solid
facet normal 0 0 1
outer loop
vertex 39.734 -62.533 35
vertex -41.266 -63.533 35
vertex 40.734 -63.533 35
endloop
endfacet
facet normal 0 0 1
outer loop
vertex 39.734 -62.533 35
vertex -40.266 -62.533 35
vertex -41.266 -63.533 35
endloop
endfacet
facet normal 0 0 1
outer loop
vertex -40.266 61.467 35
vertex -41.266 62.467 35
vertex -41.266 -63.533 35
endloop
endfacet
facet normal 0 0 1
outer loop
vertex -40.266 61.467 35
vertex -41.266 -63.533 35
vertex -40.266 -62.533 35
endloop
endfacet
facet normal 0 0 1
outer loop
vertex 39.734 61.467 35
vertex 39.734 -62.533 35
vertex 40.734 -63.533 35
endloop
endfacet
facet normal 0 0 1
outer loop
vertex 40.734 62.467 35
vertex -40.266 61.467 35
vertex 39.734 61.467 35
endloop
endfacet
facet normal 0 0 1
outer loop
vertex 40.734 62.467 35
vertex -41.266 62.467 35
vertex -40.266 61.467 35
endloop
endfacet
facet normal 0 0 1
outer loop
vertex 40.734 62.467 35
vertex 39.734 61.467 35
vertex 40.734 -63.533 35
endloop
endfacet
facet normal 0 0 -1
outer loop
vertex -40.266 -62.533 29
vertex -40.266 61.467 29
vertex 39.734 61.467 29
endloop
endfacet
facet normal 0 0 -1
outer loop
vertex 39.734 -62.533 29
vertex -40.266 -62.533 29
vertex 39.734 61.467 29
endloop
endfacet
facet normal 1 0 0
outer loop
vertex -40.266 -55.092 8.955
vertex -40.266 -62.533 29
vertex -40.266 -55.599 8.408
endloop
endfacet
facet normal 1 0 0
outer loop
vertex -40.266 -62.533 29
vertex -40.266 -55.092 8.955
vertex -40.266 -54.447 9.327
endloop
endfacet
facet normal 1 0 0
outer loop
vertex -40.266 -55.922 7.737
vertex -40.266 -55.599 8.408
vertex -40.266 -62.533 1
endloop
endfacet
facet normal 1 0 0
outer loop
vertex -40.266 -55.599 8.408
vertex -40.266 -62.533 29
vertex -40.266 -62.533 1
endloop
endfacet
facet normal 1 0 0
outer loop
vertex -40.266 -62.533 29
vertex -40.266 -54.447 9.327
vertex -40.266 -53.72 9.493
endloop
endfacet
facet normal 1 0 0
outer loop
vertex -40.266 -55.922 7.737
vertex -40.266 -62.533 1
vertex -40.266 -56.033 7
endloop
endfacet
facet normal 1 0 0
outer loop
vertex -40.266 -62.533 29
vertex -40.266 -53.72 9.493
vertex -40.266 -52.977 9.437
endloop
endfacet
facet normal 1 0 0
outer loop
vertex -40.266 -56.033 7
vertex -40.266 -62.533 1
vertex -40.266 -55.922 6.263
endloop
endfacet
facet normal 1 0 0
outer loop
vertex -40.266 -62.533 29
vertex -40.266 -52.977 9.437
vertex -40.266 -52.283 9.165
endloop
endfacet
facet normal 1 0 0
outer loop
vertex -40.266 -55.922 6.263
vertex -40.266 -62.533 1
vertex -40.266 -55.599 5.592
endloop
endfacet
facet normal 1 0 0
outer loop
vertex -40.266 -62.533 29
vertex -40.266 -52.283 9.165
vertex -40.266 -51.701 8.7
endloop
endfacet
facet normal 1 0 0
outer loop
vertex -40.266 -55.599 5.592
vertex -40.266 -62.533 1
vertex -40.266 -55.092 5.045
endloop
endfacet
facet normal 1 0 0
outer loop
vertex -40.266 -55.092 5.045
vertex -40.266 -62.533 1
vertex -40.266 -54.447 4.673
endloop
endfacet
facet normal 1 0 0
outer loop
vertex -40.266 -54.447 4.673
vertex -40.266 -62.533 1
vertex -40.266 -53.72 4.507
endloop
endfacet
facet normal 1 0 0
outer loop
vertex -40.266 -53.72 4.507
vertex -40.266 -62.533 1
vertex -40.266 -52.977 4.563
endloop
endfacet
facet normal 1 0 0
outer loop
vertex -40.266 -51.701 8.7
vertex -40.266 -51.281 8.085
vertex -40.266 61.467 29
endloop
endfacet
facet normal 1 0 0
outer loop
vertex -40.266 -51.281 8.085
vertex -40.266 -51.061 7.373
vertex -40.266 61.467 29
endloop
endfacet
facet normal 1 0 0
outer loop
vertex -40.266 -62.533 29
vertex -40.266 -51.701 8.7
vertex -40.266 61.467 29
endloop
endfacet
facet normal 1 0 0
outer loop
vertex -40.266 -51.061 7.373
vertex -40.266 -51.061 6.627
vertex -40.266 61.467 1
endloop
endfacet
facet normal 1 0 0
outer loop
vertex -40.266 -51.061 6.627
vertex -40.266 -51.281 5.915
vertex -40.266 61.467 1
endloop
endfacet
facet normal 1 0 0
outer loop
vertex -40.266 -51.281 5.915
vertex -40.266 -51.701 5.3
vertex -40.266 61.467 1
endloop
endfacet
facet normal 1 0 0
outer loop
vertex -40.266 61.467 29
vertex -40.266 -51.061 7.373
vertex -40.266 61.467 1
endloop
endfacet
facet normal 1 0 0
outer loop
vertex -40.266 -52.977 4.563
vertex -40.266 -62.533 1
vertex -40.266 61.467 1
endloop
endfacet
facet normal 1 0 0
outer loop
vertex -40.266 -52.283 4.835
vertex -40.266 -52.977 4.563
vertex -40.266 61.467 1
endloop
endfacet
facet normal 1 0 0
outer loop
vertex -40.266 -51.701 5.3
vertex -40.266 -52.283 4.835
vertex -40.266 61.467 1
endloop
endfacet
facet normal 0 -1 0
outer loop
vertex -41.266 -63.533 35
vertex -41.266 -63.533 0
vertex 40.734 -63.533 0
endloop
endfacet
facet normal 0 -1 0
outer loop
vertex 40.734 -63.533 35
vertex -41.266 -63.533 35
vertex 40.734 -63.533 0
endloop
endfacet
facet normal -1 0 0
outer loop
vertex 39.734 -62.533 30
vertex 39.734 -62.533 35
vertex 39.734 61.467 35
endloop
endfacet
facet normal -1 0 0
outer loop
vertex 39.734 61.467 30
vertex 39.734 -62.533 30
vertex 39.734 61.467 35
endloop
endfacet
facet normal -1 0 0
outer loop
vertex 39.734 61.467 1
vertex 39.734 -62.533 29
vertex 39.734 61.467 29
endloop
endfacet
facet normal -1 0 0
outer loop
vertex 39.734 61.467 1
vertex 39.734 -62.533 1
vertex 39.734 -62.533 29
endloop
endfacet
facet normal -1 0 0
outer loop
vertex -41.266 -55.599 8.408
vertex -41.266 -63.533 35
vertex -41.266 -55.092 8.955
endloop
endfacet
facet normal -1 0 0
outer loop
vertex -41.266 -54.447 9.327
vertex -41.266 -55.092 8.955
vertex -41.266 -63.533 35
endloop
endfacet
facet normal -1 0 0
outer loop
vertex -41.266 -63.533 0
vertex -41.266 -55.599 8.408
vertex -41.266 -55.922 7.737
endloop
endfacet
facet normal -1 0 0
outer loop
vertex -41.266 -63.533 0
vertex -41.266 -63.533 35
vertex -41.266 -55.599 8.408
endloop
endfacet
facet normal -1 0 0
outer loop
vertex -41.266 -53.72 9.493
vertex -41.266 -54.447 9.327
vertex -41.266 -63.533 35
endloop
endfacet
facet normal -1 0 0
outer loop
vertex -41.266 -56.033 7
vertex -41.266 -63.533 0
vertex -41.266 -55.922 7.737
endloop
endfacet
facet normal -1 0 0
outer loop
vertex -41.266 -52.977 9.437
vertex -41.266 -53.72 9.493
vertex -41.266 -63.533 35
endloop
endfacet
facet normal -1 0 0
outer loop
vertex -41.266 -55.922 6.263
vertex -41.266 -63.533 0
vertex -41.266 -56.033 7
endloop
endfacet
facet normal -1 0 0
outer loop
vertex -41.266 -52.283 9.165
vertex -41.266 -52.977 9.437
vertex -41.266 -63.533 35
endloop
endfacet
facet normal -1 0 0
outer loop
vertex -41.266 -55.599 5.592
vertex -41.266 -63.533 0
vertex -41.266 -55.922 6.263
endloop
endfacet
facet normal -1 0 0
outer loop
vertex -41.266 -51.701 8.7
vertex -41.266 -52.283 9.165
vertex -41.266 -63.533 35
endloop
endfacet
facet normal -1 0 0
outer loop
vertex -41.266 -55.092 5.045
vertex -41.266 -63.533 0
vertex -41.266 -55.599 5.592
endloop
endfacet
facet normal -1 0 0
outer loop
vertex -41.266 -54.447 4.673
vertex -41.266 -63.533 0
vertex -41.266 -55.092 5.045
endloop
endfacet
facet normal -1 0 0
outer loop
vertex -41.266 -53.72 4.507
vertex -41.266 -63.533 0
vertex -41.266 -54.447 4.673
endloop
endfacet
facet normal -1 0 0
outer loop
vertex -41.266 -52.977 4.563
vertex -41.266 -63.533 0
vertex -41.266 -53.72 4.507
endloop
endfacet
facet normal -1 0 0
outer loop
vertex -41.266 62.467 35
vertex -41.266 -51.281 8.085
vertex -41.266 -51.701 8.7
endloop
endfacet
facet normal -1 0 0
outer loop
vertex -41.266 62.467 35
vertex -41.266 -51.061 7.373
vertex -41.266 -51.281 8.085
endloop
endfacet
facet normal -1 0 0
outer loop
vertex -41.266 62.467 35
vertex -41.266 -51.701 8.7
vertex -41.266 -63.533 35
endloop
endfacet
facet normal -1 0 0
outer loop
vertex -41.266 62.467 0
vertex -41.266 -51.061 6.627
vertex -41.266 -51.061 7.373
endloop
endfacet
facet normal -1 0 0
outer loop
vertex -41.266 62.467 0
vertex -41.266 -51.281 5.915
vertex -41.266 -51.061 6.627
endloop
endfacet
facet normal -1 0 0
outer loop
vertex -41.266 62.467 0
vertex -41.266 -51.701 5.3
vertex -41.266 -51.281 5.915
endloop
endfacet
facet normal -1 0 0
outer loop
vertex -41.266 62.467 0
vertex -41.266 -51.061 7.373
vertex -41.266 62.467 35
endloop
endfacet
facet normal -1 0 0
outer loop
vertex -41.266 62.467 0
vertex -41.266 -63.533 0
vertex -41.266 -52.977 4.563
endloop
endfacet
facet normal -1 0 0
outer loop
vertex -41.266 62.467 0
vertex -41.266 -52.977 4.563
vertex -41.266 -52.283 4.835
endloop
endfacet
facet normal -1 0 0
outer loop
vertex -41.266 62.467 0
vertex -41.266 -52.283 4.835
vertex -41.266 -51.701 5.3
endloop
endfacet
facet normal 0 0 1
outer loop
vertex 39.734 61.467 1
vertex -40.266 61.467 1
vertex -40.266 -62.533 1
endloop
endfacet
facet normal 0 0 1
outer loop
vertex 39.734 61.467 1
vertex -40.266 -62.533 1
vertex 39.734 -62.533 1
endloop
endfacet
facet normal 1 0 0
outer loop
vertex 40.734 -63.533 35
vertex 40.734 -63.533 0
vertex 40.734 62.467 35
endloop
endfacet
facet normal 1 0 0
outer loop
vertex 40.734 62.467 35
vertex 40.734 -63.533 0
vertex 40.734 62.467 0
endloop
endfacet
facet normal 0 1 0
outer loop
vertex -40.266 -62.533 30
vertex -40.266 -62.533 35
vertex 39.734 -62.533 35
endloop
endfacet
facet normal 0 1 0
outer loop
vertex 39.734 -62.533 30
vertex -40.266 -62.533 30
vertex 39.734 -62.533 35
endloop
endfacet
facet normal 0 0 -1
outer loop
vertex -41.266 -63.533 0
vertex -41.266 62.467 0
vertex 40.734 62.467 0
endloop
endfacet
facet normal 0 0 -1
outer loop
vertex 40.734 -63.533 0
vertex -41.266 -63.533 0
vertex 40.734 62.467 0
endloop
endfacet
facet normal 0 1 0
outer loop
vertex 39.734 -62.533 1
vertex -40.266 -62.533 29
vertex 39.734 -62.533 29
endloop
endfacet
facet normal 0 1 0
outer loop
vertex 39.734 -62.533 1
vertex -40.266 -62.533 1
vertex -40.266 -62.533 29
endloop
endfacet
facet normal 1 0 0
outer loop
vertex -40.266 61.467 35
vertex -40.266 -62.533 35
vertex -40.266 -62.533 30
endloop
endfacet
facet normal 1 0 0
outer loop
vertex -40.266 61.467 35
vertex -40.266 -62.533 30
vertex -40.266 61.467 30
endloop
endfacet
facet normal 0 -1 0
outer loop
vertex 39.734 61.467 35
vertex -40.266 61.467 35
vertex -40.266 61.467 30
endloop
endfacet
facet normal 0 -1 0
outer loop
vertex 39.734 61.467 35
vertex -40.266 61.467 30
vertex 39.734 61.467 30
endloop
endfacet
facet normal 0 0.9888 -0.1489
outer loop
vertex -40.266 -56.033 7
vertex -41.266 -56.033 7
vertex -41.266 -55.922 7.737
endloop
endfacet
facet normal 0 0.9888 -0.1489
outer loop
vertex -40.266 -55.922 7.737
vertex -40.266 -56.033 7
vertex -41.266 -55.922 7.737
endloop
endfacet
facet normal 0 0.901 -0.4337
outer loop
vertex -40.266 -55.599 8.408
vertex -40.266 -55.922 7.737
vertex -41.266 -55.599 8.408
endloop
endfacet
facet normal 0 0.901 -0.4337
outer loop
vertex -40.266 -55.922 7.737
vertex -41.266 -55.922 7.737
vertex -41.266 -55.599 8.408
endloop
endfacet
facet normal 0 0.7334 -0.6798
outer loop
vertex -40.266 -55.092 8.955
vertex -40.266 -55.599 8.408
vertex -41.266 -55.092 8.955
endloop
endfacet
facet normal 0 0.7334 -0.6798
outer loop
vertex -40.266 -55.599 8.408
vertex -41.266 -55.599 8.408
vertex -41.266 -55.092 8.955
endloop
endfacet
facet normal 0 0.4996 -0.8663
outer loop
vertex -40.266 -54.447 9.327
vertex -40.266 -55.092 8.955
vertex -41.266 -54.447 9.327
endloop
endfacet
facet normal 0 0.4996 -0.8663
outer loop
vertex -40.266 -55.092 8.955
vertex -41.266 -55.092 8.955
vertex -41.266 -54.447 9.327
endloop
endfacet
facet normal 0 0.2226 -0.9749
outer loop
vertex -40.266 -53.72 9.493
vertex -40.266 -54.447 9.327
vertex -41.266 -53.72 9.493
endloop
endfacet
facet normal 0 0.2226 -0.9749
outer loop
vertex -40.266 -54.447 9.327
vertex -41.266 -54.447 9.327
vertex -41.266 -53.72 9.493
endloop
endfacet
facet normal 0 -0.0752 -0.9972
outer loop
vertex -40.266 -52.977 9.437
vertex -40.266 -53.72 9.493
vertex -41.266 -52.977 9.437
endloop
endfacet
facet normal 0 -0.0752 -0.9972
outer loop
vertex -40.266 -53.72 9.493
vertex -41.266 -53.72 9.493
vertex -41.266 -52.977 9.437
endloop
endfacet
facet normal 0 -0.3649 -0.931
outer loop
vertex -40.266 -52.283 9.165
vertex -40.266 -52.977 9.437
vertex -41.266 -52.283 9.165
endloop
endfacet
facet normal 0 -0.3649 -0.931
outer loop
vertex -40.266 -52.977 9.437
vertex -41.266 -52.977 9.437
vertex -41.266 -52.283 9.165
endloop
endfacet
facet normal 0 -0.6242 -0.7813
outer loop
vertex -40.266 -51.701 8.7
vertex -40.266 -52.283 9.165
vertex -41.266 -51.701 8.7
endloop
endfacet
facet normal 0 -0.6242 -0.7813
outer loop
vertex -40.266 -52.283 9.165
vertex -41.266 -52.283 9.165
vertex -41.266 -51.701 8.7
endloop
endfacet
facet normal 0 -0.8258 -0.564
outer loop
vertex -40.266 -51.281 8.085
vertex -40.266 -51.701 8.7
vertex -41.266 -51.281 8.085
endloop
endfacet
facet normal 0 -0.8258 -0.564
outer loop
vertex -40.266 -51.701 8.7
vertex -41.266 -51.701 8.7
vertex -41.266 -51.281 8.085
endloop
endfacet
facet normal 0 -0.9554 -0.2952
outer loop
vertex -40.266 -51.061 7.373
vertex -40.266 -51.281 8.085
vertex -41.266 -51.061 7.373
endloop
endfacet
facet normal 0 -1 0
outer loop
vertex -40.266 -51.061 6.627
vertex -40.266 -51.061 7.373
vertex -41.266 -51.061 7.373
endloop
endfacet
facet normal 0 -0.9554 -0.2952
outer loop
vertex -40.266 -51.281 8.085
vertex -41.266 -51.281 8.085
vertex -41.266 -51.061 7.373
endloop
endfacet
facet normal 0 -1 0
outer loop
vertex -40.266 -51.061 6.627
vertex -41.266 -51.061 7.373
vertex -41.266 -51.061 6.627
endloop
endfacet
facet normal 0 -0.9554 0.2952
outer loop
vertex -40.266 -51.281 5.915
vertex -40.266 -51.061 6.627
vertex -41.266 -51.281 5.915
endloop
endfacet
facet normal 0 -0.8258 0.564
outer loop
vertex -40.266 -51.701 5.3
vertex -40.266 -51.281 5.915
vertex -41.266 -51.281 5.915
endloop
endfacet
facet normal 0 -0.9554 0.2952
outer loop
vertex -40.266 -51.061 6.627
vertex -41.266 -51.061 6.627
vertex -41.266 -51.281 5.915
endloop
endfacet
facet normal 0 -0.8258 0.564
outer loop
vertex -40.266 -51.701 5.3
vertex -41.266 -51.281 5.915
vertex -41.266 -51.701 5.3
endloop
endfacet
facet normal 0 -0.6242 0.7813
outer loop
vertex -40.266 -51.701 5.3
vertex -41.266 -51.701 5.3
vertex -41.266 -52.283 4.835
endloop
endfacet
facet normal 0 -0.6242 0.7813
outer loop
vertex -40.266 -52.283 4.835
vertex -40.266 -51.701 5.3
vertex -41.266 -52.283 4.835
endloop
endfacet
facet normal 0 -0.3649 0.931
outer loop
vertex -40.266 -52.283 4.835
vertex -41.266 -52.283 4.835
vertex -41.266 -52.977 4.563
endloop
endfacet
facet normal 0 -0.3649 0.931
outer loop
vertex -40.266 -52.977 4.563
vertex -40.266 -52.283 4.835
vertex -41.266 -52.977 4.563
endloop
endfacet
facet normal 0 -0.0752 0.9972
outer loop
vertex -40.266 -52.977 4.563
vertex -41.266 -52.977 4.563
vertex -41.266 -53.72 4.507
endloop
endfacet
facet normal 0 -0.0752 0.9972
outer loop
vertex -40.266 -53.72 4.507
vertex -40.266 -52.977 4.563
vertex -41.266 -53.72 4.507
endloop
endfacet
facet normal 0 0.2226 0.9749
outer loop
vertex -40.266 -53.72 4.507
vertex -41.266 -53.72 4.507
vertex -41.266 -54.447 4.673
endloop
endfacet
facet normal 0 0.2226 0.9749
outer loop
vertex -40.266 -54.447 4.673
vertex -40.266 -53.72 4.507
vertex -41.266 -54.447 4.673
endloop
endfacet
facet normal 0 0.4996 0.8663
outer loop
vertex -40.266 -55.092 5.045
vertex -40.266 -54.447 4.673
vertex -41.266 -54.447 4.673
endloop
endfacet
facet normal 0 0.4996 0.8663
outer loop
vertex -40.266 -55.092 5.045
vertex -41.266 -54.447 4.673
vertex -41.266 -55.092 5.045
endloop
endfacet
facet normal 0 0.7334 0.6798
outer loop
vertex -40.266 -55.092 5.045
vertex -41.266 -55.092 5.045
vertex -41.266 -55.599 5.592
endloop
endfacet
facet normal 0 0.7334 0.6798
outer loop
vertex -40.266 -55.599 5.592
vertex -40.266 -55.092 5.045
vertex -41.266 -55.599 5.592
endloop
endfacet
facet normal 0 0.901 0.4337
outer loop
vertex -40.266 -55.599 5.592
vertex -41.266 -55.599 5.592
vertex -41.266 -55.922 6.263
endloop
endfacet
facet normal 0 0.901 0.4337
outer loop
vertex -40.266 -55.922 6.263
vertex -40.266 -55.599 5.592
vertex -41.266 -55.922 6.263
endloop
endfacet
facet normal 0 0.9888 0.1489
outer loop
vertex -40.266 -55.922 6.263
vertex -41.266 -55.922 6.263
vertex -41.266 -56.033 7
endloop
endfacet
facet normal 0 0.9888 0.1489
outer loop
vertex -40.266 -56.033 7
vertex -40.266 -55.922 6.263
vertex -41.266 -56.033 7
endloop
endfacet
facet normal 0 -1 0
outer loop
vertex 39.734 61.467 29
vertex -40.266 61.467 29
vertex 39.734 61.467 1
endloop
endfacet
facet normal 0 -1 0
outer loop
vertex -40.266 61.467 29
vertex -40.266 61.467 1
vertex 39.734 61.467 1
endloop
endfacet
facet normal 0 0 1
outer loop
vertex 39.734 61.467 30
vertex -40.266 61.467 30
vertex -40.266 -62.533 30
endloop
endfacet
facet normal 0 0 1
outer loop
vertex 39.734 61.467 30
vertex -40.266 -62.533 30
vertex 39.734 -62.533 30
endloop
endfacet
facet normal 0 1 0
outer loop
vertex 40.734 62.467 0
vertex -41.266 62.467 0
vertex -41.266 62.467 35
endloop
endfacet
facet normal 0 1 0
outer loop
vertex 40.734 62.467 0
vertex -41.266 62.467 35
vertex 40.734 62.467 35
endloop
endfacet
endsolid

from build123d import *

# Parameters (mm, degrees)
F0_W     = 82
F0_H     = 126
F1_DEPTH = 35
F2_W     = 80
F2_H     = 124
F3_DEPTH = 5
F4_DEPTH = 1
F5_T     = -1
F6_R     = 2.5
F7_DEPTH = 3


with BuildPart() as f1:
    # F0 (on Top) → F1 (new body)
    with BuildSketch(Plane.XY):
        with Locations((-0.2664038911, -0.5331769297)):
            Rectangle(F0_W, F0_H)
    extrude(amount=F1_DEPTH)

    # F2 (on face) → F3 (cut)
    with BuildSketch(Plane.XY.offset(35)):
        with Locations((-0.2664038911, -0.5331769297)):
            Rectangle(F2_W, F2_H)
    extrude(amount=-F3_DEPTH, mode=Mode.SUBTRACT)

    # F4 (add): a face of the model
    f4_faces = [f1.faces().sort_by_distance(p)[0] for p in [
        (-0.2664038911, -0.5331769297, 30),
    ]]
    extrude(f4_faces, amount=-F4_DEPTH)

    # F5 (hollow: no face is removed)
    offset(amount=F5_T, kind=Kind.INTERSECTION, mode=Mode.SUBTRACT)

    # F6 (on face) → F7 (cut)
    with BuildSketch(Plane(origin=(-41.2664038911, 0, 0), x_dir=(0, -1, 0), z_dir=(-1, 0, 0))):
        with Locations((53.5331769297, 7)):
            Circle(F6_R)
    extrude(amount=-F7_DEPTH, mode=Mode.SUBTRACT)


solid = f1.part
